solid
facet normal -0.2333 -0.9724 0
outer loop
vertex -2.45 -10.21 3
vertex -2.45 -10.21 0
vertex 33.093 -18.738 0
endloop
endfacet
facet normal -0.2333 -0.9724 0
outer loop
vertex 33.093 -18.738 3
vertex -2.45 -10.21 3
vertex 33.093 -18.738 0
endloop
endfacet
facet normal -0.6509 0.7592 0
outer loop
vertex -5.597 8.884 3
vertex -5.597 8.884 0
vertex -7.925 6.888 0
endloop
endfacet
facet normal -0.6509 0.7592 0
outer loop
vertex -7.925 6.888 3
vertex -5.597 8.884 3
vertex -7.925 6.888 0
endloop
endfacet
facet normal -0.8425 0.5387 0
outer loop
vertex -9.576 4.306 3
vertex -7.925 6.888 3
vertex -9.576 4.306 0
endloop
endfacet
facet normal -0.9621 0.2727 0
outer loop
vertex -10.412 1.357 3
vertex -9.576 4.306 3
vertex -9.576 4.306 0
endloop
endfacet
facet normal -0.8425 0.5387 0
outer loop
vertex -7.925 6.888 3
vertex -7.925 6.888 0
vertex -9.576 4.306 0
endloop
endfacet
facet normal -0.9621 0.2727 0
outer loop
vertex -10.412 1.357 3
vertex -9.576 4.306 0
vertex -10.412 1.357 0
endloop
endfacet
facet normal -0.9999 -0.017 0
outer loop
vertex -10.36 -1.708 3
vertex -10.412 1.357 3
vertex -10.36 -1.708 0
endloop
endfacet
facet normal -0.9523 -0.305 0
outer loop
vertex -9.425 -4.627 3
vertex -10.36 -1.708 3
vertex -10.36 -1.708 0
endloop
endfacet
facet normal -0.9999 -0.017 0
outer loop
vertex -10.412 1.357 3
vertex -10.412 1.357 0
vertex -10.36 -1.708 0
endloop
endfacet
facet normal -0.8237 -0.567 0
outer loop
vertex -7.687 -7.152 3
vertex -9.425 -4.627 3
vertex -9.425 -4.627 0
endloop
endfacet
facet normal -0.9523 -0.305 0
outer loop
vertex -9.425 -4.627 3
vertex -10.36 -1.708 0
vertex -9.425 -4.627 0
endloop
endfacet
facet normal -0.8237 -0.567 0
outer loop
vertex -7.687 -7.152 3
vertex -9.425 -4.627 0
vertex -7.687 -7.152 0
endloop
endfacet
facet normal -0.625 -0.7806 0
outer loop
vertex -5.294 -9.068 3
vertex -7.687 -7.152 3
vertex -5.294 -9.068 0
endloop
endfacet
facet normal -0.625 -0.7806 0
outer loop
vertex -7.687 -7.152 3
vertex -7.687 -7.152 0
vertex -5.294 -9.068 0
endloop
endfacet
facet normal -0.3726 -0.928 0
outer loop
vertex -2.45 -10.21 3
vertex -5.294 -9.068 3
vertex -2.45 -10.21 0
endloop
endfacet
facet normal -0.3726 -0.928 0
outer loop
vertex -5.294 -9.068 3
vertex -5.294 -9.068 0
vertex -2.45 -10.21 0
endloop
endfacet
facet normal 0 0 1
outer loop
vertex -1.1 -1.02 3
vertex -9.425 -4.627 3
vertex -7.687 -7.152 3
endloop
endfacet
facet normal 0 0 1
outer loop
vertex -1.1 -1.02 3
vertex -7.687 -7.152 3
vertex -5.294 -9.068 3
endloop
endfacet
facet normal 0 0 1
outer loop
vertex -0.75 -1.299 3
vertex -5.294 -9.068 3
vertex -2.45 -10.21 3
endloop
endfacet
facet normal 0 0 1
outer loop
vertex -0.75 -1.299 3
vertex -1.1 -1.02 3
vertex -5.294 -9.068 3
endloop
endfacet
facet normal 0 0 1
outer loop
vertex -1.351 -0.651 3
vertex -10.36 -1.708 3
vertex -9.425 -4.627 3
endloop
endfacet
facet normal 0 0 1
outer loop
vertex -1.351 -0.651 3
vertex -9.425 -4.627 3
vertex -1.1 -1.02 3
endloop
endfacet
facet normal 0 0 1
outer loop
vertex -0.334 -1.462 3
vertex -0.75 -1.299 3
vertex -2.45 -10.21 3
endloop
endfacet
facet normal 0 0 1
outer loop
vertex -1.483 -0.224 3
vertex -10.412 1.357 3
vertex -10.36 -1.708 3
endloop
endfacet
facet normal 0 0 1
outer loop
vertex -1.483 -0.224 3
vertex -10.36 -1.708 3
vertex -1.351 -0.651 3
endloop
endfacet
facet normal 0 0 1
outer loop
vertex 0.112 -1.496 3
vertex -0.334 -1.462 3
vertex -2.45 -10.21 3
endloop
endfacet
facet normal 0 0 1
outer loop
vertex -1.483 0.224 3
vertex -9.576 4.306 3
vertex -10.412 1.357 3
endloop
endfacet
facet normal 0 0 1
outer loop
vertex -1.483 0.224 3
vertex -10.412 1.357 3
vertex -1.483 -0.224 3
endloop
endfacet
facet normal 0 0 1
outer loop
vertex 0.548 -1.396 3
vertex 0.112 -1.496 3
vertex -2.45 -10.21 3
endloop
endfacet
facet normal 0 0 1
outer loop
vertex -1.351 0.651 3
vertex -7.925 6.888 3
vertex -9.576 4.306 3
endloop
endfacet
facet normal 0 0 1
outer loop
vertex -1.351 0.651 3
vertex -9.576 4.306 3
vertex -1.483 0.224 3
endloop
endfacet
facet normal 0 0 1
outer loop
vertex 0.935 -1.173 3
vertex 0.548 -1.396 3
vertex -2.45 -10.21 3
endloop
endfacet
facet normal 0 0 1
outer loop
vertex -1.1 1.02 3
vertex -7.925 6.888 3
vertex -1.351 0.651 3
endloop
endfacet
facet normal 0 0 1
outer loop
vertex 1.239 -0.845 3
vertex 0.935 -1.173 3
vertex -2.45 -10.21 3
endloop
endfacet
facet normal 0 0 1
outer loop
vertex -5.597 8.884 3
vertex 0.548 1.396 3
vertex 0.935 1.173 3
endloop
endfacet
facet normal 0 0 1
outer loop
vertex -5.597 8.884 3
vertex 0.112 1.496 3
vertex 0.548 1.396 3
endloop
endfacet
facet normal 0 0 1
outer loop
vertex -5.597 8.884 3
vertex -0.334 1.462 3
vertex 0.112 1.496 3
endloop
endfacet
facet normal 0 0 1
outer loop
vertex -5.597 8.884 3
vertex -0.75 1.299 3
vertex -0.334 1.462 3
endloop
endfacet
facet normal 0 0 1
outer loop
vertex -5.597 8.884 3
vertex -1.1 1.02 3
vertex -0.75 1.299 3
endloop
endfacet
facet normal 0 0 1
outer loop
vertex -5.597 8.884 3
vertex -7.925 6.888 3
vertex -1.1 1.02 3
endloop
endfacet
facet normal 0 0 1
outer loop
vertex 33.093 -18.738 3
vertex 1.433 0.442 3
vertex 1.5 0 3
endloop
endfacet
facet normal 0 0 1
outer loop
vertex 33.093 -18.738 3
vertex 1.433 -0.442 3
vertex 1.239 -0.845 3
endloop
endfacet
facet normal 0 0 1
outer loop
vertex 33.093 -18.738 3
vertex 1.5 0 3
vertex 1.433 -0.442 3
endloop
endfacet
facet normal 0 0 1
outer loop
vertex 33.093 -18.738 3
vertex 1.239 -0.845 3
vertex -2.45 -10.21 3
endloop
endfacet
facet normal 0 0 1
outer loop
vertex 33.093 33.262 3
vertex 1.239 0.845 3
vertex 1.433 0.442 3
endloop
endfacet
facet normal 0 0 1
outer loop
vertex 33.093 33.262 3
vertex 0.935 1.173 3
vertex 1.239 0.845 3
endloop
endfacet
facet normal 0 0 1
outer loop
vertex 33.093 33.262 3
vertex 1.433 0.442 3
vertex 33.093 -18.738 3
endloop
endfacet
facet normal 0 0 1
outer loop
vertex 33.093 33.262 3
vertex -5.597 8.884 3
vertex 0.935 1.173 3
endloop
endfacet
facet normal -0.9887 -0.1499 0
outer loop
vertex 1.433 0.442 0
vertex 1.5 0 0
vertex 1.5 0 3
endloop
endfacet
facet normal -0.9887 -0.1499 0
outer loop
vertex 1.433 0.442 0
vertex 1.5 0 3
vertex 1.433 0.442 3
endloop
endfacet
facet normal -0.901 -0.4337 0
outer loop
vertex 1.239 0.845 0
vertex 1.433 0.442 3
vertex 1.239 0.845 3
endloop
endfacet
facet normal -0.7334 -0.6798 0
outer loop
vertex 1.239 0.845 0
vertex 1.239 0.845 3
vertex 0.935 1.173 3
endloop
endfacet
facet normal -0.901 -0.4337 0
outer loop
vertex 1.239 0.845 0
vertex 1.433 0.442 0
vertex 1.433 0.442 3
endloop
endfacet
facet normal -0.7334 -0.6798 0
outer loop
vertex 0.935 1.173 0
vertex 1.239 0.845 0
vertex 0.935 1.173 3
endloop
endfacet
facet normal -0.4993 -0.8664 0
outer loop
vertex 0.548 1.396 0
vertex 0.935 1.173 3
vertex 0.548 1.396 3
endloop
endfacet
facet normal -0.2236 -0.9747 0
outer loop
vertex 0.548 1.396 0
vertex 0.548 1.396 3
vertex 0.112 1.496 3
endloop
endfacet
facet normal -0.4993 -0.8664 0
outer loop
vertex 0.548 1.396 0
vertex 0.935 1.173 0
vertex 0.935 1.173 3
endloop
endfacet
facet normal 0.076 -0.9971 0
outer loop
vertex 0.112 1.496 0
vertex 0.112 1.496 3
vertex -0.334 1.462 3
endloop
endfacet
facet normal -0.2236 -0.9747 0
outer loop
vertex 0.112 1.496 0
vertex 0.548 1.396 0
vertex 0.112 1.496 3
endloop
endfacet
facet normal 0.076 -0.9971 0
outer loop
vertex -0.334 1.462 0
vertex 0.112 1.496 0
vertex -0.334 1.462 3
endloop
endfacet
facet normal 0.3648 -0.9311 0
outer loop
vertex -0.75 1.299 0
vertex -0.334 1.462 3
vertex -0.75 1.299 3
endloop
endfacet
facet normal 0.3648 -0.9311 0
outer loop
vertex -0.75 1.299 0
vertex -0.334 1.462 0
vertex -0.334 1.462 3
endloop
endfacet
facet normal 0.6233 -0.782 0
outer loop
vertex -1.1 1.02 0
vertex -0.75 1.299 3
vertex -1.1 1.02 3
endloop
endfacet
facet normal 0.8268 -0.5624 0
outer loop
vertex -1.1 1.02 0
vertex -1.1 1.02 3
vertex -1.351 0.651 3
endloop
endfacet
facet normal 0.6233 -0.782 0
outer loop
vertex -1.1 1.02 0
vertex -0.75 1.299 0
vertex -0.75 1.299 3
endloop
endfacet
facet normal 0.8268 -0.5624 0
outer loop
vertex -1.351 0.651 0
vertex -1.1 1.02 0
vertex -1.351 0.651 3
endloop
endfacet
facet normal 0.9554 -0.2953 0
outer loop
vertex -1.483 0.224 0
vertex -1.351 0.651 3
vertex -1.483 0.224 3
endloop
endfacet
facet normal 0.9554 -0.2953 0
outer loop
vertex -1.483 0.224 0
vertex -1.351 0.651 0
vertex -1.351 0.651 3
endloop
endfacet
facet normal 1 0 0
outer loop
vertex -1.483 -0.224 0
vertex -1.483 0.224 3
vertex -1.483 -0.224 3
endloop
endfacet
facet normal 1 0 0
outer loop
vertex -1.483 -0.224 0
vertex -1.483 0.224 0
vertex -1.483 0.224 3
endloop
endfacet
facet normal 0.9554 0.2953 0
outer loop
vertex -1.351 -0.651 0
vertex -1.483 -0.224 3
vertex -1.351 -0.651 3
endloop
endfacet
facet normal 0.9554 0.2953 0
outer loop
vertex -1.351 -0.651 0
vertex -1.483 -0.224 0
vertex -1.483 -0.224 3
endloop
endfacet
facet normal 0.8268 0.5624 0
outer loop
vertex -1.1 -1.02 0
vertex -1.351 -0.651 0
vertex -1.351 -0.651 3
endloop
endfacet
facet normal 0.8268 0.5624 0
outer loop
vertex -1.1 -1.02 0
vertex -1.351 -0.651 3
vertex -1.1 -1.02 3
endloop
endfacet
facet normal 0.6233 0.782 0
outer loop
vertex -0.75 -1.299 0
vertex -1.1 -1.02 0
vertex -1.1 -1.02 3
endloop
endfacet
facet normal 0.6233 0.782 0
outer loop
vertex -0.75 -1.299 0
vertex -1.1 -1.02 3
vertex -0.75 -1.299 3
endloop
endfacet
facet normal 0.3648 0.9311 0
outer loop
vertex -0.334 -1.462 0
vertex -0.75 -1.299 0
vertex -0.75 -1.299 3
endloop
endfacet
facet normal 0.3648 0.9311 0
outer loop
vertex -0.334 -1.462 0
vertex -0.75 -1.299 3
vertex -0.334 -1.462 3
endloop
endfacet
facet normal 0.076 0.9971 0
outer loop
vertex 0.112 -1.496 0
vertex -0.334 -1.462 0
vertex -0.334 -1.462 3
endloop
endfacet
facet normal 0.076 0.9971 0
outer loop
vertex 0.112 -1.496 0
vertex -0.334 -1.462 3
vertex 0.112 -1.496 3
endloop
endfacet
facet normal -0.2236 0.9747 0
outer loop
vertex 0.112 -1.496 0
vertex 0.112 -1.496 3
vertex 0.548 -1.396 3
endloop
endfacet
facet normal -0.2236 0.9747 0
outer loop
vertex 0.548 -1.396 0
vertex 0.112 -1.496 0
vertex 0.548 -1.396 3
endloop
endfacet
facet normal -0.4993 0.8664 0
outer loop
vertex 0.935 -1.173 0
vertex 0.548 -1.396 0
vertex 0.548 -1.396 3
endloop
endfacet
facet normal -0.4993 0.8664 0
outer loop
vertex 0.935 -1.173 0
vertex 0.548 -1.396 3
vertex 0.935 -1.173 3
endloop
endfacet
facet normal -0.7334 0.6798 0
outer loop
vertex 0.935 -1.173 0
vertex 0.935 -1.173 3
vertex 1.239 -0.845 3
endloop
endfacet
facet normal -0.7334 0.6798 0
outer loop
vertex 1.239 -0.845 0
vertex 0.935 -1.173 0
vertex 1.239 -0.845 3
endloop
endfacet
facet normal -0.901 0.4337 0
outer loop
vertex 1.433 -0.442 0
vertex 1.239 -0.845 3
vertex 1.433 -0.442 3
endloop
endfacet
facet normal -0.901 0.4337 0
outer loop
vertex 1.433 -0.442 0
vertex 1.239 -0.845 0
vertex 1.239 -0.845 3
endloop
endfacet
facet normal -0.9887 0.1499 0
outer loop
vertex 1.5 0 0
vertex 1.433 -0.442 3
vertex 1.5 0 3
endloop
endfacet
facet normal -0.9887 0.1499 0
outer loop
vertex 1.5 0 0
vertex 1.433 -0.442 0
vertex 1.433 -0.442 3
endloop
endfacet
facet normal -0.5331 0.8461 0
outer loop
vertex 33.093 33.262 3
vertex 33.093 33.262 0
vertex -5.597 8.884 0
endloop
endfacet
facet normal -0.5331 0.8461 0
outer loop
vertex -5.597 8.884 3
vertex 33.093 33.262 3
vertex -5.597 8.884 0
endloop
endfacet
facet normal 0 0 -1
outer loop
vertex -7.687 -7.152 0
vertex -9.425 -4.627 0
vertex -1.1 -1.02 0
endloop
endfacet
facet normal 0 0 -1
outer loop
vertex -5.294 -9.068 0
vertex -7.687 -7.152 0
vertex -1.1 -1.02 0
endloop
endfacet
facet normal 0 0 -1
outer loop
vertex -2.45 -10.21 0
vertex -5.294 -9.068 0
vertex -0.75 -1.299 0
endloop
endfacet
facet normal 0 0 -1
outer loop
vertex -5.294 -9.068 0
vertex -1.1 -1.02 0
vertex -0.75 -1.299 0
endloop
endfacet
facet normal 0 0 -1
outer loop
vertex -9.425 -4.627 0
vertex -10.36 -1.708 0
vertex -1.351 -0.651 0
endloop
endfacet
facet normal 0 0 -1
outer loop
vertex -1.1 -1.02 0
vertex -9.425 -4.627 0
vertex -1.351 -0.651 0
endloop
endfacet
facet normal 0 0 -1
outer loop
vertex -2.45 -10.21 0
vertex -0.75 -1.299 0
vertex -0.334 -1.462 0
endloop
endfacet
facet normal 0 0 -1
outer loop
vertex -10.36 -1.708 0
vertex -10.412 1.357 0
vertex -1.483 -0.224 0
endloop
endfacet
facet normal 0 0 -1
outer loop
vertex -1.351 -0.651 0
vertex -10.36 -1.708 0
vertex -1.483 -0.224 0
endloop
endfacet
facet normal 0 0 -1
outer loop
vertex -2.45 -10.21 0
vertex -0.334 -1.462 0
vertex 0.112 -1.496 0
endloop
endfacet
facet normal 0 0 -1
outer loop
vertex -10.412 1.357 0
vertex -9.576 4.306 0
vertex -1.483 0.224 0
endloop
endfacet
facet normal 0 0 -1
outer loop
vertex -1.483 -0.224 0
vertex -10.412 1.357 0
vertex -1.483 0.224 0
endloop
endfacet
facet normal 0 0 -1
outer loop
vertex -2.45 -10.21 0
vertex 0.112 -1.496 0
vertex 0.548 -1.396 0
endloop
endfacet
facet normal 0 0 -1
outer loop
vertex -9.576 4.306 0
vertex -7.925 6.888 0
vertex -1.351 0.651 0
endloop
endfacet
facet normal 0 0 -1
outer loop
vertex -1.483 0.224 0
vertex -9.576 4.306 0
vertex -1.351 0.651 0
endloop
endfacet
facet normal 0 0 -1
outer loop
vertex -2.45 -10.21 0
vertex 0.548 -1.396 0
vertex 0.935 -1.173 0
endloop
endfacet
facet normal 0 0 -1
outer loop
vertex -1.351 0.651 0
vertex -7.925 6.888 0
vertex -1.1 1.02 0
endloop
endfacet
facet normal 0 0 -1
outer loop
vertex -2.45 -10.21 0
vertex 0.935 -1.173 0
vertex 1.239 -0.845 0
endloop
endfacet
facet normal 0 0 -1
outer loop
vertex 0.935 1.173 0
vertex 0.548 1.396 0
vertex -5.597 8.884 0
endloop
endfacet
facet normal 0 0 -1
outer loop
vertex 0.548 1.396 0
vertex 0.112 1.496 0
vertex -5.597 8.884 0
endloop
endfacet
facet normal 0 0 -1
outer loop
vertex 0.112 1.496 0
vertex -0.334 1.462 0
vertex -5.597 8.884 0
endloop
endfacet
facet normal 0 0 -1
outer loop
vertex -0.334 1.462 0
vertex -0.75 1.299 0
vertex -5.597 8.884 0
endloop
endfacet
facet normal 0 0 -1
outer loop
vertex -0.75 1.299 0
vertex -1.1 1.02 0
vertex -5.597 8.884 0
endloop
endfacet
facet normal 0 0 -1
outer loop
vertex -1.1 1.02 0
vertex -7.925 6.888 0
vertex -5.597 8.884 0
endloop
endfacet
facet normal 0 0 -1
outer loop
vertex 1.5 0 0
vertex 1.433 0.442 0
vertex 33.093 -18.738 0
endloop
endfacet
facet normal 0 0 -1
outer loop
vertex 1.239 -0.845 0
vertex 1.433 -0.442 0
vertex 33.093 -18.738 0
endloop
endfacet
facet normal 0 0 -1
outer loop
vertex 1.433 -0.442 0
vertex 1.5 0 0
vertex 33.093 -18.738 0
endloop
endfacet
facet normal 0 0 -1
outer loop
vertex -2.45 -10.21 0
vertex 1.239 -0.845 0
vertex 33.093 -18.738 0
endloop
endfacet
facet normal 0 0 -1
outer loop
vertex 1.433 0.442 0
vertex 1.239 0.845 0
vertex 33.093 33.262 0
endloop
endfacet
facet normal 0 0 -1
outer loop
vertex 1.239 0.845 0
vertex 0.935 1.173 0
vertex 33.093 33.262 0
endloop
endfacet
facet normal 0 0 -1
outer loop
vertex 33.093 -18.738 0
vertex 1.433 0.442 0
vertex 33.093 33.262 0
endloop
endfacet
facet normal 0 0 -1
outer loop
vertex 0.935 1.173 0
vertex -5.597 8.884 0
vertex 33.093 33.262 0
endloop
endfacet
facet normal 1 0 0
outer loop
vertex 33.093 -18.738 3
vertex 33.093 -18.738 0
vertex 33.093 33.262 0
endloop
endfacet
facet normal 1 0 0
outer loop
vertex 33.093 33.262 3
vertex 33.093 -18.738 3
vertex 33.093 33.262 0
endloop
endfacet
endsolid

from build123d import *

# Parameters (mm, degrees)
MODEL_R                 = 1.500000302
SALIENTE_EXTRUIR1_DEPTH = 3


with BuildPart() as part:
    # Model → Saliente-Extruir1 (new body)
    with BuildSketch(Plane.XY):
        with BuildLine():
            Line((33.092598302, 20.364675113), (33.092598302, 33.261670113))
            Line((33.092598302, 33.261670113), (-5.597442698, 8.883616113))
            ThreePointArc((-5.597442698, 8.883616113), (-10.360174651, -1.707858659), (-2.449856698, -10.210200887))
            Line((-2.449856698, -10.210200887), (33.092598302, -18.738329887))
            Line((33.092598302, -18.738329887), (33.092598302, 20.364675113))
        make_face()
        Circle(MODEL_R, mode=Mode.SUBTRACT)
    extrude(amount=SALIENTE_EXTRUIR1_DEPTH)


solid = part.part
